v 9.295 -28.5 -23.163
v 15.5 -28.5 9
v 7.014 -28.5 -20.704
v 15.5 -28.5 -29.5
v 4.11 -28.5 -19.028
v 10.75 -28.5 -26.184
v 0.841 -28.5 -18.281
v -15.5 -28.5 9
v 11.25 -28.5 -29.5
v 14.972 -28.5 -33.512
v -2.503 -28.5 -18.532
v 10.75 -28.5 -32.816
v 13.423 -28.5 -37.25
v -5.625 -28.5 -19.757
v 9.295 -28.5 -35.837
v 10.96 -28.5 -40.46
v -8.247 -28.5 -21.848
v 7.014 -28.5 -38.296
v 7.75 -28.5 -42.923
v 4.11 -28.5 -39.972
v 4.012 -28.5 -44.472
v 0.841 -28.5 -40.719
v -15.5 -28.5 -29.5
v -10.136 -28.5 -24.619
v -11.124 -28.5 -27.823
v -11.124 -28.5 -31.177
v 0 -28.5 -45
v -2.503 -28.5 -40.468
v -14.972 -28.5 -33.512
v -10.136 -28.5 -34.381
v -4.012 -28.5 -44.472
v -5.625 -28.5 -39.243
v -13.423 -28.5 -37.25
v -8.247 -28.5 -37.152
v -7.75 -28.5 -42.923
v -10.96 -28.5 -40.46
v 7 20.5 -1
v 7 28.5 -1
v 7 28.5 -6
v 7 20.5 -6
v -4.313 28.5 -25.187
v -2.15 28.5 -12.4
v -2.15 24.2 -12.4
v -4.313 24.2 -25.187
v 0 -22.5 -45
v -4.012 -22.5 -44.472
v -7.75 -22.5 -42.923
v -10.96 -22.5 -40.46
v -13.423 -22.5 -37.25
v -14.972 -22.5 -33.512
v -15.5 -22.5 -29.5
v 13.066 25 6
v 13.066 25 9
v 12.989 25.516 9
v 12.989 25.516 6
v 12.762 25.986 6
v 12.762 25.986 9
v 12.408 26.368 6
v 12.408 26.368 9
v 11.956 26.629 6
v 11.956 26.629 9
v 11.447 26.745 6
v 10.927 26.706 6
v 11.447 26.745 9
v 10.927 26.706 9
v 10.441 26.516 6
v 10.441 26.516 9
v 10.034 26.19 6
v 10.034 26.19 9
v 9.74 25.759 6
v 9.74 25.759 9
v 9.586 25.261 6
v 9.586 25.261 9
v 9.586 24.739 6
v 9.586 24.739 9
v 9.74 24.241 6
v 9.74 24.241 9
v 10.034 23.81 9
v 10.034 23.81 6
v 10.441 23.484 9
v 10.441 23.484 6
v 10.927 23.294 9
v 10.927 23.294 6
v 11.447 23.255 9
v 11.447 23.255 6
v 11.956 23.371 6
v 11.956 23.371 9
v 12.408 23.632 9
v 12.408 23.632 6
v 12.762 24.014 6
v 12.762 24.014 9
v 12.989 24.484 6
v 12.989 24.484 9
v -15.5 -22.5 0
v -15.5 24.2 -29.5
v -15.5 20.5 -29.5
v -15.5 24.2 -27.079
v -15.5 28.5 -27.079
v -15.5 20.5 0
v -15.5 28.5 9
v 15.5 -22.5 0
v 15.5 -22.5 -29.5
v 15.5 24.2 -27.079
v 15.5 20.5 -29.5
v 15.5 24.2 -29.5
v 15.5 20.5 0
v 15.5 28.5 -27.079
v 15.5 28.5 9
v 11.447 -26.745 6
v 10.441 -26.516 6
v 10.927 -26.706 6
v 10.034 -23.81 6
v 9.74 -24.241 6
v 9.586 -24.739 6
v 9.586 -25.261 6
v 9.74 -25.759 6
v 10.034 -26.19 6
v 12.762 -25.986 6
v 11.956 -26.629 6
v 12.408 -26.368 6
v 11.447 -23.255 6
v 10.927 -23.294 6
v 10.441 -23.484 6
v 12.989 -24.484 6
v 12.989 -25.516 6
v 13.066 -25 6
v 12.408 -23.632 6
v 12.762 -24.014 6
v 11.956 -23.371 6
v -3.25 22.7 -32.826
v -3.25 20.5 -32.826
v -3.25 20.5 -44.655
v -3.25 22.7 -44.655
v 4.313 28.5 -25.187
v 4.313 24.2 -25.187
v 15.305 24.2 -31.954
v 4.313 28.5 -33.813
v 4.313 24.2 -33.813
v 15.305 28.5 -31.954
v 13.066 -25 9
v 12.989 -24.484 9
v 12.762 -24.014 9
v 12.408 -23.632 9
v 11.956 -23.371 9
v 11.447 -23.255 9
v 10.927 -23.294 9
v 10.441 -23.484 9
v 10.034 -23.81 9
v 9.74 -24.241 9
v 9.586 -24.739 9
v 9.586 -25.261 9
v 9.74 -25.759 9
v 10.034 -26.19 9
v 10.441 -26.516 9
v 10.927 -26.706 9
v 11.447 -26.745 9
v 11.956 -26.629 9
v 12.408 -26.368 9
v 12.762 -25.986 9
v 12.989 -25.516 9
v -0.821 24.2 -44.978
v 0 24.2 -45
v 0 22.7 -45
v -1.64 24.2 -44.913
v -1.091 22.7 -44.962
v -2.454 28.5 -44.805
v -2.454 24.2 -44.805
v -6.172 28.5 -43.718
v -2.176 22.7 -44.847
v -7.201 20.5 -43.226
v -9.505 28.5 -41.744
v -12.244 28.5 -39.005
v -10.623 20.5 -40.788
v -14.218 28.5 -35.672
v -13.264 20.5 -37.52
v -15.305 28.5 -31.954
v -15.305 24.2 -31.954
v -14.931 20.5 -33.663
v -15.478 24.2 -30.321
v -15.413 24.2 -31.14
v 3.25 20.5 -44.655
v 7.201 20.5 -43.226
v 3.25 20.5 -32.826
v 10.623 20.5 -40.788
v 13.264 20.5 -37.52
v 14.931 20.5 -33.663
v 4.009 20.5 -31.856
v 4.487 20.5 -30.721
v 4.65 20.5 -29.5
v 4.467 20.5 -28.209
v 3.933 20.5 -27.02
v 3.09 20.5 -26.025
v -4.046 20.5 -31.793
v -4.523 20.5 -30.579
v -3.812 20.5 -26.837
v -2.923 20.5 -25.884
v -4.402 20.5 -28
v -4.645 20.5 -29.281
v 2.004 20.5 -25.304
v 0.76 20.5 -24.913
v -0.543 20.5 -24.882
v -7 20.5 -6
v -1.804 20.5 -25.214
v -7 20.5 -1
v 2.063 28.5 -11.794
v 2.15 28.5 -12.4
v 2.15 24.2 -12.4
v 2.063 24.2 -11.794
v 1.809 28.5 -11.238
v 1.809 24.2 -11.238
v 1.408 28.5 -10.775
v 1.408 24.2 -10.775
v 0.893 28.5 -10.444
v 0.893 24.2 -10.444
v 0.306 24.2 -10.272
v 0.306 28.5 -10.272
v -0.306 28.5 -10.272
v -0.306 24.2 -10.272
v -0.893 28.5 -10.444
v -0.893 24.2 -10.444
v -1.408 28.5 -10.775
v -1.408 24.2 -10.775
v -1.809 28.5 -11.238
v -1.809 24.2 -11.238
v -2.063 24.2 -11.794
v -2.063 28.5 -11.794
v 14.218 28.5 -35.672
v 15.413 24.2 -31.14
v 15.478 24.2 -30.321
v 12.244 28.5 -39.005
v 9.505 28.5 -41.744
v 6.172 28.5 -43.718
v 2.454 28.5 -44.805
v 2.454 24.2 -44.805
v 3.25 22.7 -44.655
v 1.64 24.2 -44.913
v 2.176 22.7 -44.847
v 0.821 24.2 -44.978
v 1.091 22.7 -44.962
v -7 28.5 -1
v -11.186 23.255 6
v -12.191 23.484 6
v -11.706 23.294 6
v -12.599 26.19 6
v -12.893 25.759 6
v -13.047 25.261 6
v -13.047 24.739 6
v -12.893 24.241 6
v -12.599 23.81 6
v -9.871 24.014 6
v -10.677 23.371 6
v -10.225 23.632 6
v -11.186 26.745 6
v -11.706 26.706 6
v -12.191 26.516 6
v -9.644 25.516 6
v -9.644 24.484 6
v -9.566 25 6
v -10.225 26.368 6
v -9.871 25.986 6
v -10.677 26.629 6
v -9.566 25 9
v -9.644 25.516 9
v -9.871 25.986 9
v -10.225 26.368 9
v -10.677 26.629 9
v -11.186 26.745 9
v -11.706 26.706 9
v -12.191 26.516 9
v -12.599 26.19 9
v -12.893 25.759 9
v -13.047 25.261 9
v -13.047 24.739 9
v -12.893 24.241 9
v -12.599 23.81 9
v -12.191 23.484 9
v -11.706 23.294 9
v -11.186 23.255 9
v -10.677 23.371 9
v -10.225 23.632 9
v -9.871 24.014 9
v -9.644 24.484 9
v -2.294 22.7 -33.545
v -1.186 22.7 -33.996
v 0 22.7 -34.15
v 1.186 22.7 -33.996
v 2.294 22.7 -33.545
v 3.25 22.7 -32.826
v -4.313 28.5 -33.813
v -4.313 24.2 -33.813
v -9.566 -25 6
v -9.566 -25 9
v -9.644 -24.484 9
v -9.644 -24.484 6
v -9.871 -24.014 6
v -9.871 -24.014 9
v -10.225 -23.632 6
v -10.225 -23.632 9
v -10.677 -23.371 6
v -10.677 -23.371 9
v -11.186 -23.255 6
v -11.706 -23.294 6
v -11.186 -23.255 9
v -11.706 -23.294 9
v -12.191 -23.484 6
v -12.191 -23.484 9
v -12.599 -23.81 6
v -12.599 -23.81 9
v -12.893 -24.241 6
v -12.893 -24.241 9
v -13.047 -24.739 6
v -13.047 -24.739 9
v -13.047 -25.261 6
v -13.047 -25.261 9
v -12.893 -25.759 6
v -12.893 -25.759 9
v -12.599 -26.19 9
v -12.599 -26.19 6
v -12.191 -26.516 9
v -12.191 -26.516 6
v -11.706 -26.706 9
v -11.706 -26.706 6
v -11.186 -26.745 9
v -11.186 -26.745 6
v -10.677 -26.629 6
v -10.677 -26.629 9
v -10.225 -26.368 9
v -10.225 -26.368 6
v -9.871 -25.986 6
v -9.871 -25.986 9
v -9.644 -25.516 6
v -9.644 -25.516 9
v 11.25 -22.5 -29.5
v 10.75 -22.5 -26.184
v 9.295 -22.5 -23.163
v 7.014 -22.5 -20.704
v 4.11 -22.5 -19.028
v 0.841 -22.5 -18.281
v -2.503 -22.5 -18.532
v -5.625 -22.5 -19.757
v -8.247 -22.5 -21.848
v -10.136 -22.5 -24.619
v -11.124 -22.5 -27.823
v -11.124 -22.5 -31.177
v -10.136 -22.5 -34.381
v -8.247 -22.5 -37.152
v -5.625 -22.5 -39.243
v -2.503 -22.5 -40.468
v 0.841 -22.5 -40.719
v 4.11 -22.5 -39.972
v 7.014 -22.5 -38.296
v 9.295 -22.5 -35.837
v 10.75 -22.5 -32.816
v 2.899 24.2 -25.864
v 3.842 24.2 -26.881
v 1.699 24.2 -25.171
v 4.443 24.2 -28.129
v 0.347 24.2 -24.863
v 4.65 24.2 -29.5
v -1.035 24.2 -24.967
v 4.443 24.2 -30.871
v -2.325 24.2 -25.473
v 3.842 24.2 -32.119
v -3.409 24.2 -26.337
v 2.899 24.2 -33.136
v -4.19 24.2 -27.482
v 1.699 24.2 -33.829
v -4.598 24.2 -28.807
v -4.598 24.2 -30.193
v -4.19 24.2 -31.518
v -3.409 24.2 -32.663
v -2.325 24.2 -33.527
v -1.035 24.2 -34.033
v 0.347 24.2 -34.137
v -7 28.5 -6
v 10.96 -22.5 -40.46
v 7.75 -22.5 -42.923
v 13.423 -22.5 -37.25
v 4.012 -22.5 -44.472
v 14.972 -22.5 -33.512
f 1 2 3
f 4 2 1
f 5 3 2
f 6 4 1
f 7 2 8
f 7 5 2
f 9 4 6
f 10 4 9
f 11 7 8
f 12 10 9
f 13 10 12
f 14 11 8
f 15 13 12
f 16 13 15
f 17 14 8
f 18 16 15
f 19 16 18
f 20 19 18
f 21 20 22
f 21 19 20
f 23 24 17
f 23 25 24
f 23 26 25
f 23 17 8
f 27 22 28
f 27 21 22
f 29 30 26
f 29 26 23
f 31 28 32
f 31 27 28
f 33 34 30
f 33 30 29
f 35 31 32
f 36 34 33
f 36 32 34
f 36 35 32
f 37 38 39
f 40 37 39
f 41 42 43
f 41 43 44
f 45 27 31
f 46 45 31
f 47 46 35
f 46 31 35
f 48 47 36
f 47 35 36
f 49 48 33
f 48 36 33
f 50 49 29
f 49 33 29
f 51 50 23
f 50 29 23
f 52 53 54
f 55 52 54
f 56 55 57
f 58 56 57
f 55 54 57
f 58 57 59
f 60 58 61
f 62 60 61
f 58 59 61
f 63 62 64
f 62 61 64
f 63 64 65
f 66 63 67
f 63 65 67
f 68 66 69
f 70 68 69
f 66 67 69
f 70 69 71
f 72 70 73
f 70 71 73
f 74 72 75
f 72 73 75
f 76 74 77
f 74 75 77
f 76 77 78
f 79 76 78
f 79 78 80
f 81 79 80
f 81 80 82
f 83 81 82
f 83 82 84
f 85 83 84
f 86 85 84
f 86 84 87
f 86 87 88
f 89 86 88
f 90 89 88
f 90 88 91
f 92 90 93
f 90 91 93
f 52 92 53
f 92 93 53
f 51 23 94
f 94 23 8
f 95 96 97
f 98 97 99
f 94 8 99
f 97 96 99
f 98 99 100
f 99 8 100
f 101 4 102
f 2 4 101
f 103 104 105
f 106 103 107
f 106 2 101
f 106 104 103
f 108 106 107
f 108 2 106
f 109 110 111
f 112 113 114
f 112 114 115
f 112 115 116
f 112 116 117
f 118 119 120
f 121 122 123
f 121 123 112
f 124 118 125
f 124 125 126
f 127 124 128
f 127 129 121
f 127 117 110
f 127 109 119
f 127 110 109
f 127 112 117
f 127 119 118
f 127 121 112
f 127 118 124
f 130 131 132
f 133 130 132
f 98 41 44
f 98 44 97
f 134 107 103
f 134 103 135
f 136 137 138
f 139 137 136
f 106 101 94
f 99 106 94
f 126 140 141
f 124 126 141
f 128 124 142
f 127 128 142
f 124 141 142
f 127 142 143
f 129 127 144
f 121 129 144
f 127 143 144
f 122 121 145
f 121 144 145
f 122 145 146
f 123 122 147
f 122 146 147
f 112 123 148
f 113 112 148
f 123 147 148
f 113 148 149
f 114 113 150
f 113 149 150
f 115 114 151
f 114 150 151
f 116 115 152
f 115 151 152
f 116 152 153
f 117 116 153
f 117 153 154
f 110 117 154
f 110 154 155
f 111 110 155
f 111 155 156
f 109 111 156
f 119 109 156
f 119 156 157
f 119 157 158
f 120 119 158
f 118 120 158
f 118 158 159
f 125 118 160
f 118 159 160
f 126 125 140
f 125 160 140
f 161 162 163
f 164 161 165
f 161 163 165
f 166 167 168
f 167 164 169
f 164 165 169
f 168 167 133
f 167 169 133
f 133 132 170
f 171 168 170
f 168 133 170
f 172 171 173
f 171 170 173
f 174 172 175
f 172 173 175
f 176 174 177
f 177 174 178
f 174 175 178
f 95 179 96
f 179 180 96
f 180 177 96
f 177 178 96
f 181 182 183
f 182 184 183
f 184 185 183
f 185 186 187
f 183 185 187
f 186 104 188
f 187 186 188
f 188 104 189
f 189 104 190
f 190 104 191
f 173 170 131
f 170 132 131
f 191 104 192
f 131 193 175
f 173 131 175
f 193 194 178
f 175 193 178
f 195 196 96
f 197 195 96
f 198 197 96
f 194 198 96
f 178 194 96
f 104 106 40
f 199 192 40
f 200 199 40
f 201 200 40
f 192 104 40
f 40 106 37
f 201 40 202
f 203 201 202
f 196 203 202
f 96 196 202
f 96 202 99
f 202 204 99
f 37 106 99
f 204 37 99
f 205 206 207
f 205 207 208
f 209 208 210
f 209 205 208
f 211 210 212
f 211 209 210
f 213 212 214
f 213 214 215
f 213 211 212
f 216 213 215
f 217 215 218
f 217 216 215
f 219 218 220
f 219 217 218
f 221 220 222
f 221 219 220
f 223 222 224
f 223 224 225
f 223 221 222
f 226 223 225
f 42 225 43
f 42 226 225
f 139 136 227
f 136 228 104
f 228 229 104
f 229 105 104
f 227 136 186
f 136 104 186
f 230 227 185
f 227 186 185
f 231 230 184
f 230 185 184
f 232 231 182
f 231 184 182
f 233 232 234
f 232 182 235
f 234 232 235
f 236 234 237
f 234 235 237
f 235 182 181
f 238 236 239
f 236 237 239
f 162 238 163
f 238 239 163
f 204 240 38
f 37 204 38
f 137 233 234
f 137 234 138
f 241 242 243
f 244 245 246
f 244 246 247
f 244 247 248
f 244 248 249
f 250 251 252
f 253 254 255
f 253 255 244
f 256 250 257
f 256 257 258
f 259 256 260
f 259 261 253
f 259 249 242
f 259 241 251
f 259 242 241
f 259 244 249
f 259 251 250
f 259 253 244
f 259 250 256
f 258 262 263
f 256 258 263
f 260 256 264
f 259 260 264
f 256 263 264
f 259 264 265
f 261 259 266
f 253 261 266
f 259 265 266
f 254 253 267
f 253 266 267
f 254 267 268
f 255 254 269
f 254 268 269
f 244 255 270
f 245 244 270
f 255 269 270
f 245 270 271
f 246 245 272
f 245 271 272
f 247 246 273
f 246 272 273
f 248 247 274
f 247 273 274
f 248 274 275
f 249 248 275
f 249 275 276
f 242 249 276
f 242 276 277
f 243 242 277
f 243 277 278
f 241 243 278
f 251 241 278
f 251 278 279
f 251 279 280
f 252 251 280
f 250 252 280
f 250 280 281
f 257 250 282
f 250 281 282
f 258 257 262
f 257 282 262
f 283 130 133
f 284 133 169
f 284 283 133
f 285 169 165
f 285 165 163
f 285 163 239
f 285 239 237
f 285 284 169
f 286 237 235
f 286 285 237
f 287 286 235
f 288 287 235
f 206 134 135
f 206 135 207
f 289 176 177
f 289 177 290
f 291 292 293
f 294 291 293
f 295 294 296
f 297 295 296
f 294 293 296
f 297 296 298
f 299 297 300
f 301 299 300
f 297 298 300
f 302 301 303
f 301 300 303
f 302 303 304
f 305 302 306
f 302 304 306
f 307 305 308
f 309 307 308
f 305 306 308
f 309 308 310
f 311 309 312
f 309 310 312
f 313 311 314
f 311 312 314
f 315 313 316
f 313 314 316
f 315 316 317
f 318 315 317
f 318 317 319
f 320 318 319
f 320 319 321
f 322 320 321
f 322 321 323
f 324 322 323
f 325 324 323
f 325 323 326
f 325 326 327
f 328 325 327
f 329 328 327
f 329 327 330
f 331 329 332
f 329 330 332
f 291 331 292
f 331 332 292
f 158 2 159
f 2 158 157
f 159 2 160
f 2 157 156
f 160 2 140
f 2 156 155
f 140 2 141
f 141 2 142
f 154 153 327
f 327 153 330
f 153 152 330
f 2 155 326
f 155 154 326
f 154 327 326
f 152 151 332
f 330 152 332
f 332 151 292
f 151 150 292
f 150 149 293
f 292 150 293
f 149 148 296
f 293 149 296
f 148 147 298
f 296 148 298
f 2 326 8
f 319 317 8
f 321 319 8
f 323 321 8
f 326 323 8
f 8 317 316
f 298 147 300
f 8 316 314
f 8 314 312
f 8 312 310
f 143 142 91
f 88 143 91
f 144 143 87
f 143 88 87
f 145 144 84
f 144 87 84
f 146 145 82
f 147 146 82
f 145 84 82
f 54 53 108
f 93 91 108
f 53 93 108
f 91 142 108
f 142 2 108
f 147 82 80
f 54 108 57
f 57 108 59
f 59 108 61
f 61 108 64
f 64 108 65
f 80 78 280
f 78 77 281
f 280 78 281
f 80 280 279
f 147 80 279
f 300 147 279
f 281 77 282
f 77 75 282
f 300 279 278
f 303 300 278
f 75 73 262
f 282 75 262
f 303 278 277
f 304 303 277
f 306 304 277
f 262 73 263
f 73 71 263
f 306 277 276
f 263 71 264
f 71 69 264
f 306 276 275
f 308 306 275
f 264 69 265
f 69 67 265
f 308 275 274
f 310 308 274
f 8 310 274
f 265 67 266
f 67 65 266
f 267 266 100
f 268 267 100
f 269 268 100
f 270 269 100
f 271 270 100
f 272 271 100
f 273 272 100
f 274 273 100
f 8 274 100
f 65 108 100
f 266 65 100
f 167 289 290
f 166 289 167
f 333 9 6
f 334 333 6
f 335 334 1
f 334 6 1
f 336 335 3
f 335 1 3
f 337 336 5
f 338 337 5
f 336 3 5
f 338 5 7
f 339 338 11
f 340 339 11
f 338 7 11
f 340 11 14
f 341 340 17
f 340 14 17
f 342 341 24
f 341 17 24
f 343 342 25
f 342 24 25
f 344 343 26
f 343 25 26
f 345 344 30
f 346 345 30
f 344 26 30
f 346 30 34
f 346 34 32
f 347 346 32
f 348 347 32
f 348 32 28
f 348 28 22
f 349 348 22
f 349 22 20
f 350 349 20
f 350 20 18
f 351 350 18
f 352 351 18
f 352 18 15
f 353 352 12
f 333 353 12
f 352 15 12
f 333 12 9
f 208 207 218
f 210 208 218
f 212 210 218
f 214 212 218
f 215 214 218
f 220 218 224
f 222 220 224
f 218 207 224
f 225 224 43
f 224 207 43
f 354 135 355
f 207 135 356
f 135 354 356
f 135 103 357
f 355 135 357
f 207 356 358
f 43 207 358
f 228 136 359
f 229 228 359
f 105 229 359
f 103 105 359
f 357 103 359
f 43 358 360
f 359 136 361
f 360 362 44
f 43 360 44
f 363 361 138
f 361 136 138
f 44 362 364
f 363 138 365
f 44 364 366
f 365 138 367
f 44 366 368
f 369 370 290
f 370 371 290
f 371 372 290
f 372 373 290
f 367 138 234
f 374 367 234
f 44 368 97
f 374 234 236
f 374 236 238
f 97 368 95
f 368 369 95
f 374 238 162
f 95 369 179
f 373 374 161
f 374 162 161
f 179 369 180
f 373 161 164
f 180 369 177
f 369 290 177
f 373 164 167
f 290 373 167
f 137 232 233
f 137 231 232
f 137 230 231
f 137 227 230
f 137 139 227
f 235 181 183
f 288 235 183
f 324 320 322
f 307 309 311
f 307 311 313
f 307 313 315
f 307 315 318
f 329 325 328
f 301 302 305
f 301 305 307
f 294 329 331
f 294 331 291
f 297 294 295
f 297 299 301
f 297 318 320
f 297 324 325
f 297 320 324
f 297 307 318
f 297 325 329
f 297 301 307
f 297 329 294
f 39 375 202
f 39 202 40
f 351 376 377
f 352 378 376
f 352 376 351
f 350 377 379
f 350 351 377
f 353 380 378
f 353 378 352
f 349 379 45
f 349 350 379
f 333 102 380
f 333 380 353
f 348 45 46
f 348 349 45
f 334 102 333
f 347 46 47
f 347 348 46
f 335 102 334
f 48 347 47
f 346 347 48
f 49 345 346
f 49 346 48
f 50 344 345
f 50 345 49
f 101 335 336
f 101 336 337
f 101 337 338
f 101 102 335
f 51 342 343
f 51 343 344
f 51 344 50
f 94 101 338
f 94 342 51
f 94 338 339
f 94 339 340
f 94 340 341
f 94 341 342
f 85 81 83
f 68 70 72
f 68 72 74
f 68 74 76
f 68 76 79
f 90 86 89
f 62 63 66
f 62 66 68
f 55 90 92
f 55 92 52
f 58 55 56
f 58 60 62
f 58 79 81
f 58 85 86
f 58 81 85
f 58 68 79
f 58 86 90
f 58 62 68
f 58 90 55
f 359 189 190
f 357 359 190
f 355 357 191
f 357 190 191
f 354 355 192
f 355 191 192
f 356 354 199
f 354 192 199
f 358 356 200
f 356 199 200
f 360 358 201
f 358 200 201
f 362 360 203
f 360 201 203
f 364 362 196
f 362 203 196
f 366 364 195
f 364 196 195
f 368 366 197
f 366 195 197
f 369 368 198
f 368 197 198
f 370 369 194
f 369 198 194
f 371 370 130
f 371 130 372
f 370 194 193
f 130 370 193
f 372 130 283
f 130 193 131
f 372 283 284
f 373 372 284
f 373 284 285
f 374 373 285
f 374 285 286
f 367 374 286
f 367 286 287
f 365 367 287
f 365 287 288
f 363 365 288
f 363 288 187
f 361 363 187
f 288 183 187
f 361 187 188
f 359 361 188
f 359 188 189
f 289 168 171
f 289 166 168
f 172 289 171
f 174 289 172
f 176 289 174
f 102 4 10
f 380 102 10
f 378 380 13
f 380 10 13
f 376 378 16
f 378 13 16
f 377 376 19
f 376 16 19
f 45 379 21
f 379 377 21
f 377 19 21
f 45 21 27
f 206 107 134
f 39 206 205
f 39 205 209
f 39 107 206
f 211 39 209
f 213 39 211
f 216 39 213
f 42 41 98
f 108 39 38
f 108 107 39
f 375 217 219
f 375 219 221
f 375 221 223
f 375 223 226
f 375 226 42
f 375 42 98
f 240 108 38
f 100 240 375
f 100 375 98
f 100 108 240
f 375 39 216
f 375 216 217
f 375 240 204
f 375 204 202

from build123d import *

# Parameters (mm, degrees)
BOSS_EXTRUDE1_DEPTH = 9
SKETCH4_W           = 31
SKETCH4_H           = 8
SKETCH4_H_2         = 6
BOSS_EXTRUDE4_DEPTH = 45
CUT_EXTRUDE1_DEPTH  = 58
SKETCH6_3_R         = 11.25
CUT_EXTRUDE2_DEPTH  = 6
CUT_EXTRUDE3_DEPTH  = 4.3
CUT_EXTRUDE4_DEPTH  = 2.2
SKETCH9_3_R         = 4.65
CUT_EXTRUDE5_DEPTH  = 8
SKETCH13_W          = 14
SKETCH13_H          = 5
CUT_EXTRUDE8_DEPTH  = 9
SKETCH14_R          = 1.75
CUT_EXTRUDE9_DEPTH  = 3


with BuildPart() as part:
    # Sketch1 → Boss-Extrude1 (new body)
    with BuildSketch(Plane.XY):
        Polygon((15.5, -28.5), (-15.5, -28.5), (-15.5, -10.3), (-15.5, 10.3), (-15.5, 28.5), (15.5, 28.5), align=None)
    extrude(amount=BOSS_EXTRUDE1_DEPTH)

    # Sketch4 → Boss-Extrude4 (add)
    with BuildSketch(Plane(origin=(0, 0, 0), x_dir=(-1, 0, 0), z_dir=(0, 0, -1))):
        with Locations((0, 24.5)):
            Rectangle(SKETCH4_W, SKETCH4_H)
        with Locations((0, -25.5)):
            Rectangle(SKETCH4_W, SKETCH4_H_2)
    extrude(amount=BOSS_EXTRUDE4_DEPTH)

    # Sketch6 → Cut-Extrude1 (cut, through all)
    with BuildSketch(Plane.XZ.offset(28.5)):
        with BuildLine():
            ThreePointArc((15.5, -29.5), (10.960155101, -40.460155116), (-2.1e-08, -45))
            Line((-2.1e-08, -45), (15.5, -45))
            Line((15.5, -45), (15.5, -29.5))
        make_face()
        with BuildLine():
            ThreePointArc((-2.1e-08, -45), (-10.960155116, -40.460155101), (-15.5, -29.5))
            Line((-15.5, -29.5), (-15.5, -45))
            Line((-15.5, -45), (-2.1e-08, -45))
        make_face()
    extrude(amount=-CUT_EXTRUDE1_DEPTH, mode=Mode.SUBTRACT)

    # Sketch6<3> → Cut-Extrude2 (cut)
    with BuildSketch(Plane.XZ.offset(28.5)):
        with Locations((0, -29.5)):
            Circle(SKETCH6_3_R)
    extrude(amount=-CUT_EXTRUDE2_DEPTH, mode=Mode.SUBTRACT)

    # Sketch7 → Cut-Extrude3 (cut)
    with BuildSketch(Plane(origin=(0, 28.5, 0), x_dir=(1, 0, 0), z_dir=(0, 1, 0))):
        with BuildLine():
            Line((-17.1, 31.65), (-4.313351365, 33.813351365))
            Line((-4.313351365, 33.813351365), (-2.15, 46.6))
            ThreePointArc((-2.15, 46.6), (0, 48.75), (2.15, 46.6))
            Line((2.15, 46.6), (4.313351365, 33.813351365))
            Line((4.313351365, 33.813351365), (17.1, 31.65))
            ThreePointArc((17.1, 31.65), (19.25, 29.5), (17.1, 27.35))
            Line((17.1, 27.35), (4.313351365, 25.186648635))
            Line((4.313351365, 25.186648635), (2.15, 12.4))
            ThreePointArc((2.15, 12.4), (0, 10.25), (-2.15, 12.4))
            Line((-2.15, 12.4), (-4.313351365, 25.186648635))
            Line((-4.313351365, 25.186648635), (-17.1, 27.35))
            ThreePointArc((-17.1, 27.35), (-19.25, 29.5), (-17.1, 31.65))
        make_face()
    extrude(amount=-CUT_EXTRUDE3_DEPTH, mode=Mode.SUBTRACT)

    # Sketch9 → Cut-Extrude4 (cut)
    with BuildSketch(Plane.XZ.offset(-20.5)):
        with BuildLine():
            ThreePointArc((3.25, -32.82565783), (0, -34.15), (-3.25, -32.82565783))
            Line((-3.25, -32.82565783), (-3.25, -44.655444566))
            ThreePointArc((-3.25, -44.655444566), (0, -45), (3.25, -44.655444566))
            Line((3.25, -44.655444566), (3.25, -32.82565783))
        make_face()
    extrude(amount=-CUT_EXTRUDE4_DEPTH, mode=Mode.SUBTRACT)

    # Sketch9<3> → Cut-Extrude5 (cut)
    with BuildSketch(Plane.XZ.offset(-20.5)):
        with Locations((0, -29.5)):
            Circle(SKETCH9_3_R)
    extrude(amount=-CUT_EXTRUDE5_DEPTH, mode=Mode.SUBTRACT)

    # Sketch13 → Cut-Extrude8 (cut)
    with BuildSketch(Plane(origin=(0, 28.5, 0), x_dir=(1, 0, 0), z_dir=(0, 1, 0))):
        with Locations((0, 3.5)):
            Rectangle(SKETCH13_W, SKETCH13_H)
    extrude(amount=-CUT_EXTRUDE8_DEPTH, mode=Mode.SUBTRACT)

    # Sketch14 → Cut-Extrude9 (cut)
    with BuildSketch(Plane.XY.offset(9)):
        with Locations((11.31642939, 25)):
            Circle(SKETCH14_R)
        with Locations((-11.31642939, 25)):
            Circle(SKETCH14_R)
        with Locations((11.31642939, -25)):
            Circle(SKETCH14_R)
        with Locations((-11.31642939, -25)):
            Circle(SKETCH14_R)
    extrude(amount=-CUT_EXTRUDE9_DEPTH, mode=Mode.SUBTRACT)


solid = part.part
